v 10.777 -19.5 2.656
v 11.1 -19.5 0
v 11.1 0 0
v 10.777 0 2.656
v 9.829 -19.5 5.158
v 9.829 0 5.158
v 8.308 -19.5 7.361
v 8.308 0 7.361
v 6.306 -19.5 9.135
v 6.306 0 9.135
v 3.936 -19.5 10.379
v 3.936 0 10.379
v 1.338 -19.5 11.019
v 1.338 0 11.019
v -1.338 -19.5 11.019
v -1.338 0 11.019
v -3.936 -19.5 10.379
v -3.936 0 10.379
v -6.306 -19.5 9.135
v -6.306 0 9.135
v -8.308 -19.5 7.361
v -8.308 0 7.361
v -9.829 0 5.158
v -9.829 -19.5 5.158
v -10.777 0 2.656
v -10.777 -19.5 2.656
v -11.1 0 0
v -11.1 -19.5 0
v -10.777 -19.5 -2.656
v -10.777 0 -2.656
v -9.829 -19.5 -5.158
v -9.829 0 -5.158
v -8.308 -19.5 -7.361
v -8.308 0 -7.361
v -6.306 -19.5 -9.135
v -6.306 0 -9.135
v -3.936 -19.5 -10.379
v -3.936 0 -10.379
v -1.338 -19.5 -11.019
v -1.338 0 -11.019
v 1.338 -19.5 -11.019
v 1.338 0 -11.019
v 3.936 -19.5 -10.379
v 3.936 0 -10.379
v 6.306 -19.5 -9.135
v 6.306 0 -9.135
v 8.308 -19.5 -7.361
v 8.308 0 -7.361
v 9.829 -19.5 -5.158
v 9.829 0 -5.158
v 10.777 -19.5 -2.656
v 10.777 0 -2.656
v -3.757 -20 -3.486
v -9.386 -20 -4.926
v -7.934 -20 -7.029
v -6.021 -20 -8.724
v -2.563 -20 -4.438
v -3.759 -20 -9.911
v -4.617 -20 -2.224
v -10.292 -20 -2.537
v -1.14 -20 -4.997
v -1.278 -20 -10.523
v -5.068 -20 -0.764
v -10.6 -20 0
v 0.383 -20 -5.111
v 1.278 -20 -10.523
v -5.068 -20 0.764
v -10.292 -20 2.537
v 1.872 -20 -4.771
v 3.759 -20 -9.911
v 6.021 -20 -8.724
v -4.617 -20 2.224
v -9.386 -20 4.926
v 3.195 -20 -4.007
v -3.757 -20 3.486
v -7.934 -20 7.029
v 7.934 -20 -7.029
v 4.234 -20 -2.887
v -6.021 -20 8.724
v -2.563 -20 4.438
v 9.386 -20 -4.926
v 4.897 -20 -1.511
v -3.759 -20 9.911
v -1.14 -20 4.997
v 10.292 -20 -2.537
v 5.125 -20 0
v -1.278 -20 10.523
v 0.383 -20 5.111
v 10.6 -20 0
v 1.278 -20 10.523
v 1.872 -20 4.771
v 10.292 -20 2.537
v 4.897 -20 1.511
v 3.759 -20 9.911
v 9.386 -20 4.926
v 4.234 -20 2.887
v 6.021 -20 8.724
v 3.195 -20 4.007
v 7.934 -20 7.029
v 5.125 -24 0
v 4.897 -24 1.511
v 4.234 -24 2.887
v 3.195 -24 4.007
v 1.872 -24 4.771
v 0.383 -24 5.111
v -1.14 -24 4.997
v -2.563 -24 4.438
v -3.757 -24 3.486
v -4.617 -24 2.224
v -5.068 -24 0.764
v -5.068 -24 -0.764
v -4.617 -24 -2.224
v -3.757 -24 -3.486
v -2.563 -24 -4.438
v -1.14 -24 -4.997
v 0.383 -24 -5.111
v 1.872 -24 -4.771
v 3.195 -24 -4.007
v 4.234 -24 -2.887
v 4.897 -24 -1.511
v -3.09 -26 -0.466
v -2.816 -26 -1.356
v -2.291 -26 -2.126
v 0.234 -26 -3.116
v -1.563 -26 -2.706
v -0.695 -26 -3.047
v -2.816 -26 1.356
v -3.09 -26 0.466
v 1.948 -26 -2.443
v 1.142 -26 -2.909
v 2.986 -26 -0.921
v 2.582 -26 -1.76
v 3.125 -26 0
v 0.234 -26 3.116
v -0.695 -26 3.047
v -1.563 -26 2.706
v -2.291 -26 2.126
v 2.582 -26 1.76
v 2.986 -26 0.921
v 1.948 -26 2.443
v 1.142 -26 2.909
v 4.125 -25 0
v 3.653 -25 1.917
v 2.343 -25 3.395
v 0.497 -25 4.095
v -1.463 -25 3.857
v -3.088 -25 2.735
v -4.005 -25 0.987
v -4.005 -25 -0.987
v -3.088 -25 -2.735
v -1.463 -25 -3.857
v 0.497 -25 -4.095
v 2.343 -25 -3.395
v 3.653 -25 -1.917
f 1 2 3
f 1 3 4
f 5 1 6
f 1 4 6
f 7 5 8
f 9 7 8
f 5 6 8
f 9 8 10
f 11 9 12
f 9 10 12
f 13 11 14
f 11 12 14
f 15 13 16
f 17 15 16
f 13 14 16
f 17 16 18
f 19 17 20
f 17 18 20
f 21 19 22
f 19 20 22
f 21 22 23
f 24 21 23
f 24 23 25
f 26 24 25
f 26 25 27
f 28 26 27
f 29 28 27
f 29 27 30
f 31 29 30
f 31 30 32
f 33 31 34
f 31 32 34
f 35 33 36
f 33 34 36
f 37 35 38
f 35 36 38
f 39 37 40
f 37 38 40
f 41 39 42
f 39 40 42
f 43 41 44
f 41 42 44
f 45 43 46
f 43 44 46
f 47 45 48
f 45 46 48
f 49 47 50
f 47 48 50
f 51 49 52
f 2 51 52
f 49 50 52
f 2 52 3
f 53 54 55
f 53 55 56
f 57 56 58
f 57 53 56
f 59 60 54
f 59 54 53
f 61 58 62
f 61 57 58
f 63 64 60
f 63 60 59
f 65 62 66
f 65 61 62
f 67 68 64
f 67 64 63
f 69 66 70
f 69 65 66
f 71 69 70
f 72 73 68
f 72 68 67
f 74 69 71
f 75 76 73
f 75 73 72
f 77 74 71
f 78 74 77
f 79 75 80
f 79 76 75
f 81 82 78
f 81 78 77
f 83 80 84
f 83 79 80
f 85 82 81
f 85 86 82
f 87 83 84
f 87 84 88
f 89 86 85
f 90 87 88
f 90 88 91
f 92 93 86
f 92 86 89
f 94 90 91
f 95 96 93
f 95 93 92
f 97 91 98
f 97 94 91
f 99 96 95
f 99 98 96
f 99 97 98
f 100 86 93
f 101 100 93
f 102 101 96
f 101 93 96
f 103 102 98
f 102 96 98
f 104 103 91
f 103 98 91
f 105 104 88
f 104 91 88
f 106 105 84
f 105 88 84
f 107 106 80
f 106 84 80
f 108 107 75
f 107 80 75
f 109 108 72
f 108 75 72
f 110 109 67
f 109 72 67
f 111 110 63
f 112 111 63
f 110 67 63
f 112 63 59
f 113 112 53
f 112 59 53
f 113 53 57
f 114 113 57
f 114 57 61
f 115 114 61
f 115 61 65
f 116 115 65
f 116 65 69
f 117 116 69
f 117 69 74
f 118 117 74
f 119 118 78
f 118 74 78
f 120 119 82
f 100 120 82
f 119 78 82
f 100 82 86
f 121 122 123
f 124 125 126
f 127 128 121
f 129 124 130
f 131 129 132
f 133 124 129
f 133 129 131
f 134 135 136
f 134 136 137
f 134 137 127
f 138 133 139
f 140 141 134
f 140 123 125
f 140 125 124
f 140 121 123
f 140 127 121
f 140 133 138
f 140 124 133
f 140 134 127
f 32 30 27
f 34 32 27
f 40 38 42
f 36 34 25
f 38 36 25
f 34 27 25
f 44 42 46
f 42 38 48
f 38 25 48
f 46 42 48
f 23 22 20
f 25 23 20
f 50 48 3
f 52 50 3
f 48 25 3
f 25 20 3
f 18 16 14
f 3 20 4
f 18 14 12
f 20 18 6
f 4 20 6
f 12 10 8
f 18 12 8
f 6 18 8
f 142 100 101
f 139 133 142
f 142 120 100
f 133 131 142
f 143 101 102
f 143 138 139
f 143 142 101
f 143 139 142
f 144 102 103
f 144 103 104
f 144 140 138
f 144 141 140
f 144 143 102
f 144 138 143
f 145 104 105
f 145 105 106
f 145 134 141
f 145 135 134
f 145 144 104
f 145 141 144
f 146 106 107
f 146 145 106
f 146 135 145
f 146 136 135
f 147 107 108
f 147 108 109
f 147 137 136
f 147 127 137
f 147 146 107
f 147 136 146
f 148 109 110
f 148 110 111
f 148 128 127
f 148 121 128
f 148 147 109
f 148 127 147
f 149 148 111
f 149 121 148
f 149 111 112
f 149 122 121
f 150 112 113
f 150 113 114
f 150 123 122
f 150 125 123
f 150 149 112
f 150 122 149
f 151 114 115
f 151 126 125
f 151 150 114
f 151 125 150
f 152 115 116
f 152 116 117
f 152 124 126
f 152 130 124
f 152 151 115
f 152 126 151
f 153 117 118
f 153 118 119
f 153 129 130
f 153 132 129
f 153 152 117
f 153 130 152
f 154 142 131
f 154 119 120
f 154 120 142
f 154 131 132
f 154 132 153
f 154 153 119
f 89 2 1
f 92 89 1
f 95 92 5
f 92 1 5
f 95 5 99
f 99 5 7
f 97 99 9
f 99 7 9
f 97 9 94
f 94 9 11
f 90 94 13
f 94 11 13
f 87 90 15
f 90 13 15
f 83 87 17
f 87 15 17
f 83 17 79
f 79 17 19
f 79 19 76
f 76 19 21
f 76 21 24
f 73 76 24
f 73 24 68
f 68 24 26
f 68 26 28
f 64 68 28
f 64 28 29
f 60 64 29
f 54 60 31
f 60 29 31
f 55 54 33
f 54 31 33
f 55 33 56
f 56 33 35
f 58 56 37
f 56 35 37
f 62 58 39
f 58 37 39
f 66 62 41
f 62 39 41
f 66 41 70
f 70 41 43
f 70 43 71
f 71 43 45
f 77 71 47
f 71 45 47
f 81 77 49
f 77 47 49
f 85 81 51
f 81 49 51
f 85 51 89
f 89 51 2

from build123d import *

# Parameters (mm, degrees)
F0_R     = 11.1
F1_DEPTH = 20
F2_R     = 5.125
F3_DEPTH = 6
F4_SIZE  = 2
F5_SIZE  = 0.5


with BuildPart() as f1:
    # F0 (on Front) → F1 (new body)
    with BuildSketch(Plane.XZ):
        Circle(F0_R)
    extrude(amount=F1_DEPTH)

    # F2 (on face) → F3 (join)
    with BuildSketch(Plane.XZ.offset(20)):
        Circle(F2_R)
    extrude(amount=F3_DEPTH)

    # F4
    f4_edges = [f1.edges().sort_by_distance(p)[0] for p in [
        (-5.125, -26, 0),
    ]]
    chamfer(f4_edges, length=F4_SIZE)

    # F5
    f5_edges = [f1.edges().sort_by_distance(p)[0] for p in [
        (-11.1, -20, 0),
    ]]
    chamfer(f5_edges, length=F5_SIZE)


solid = f1.part
